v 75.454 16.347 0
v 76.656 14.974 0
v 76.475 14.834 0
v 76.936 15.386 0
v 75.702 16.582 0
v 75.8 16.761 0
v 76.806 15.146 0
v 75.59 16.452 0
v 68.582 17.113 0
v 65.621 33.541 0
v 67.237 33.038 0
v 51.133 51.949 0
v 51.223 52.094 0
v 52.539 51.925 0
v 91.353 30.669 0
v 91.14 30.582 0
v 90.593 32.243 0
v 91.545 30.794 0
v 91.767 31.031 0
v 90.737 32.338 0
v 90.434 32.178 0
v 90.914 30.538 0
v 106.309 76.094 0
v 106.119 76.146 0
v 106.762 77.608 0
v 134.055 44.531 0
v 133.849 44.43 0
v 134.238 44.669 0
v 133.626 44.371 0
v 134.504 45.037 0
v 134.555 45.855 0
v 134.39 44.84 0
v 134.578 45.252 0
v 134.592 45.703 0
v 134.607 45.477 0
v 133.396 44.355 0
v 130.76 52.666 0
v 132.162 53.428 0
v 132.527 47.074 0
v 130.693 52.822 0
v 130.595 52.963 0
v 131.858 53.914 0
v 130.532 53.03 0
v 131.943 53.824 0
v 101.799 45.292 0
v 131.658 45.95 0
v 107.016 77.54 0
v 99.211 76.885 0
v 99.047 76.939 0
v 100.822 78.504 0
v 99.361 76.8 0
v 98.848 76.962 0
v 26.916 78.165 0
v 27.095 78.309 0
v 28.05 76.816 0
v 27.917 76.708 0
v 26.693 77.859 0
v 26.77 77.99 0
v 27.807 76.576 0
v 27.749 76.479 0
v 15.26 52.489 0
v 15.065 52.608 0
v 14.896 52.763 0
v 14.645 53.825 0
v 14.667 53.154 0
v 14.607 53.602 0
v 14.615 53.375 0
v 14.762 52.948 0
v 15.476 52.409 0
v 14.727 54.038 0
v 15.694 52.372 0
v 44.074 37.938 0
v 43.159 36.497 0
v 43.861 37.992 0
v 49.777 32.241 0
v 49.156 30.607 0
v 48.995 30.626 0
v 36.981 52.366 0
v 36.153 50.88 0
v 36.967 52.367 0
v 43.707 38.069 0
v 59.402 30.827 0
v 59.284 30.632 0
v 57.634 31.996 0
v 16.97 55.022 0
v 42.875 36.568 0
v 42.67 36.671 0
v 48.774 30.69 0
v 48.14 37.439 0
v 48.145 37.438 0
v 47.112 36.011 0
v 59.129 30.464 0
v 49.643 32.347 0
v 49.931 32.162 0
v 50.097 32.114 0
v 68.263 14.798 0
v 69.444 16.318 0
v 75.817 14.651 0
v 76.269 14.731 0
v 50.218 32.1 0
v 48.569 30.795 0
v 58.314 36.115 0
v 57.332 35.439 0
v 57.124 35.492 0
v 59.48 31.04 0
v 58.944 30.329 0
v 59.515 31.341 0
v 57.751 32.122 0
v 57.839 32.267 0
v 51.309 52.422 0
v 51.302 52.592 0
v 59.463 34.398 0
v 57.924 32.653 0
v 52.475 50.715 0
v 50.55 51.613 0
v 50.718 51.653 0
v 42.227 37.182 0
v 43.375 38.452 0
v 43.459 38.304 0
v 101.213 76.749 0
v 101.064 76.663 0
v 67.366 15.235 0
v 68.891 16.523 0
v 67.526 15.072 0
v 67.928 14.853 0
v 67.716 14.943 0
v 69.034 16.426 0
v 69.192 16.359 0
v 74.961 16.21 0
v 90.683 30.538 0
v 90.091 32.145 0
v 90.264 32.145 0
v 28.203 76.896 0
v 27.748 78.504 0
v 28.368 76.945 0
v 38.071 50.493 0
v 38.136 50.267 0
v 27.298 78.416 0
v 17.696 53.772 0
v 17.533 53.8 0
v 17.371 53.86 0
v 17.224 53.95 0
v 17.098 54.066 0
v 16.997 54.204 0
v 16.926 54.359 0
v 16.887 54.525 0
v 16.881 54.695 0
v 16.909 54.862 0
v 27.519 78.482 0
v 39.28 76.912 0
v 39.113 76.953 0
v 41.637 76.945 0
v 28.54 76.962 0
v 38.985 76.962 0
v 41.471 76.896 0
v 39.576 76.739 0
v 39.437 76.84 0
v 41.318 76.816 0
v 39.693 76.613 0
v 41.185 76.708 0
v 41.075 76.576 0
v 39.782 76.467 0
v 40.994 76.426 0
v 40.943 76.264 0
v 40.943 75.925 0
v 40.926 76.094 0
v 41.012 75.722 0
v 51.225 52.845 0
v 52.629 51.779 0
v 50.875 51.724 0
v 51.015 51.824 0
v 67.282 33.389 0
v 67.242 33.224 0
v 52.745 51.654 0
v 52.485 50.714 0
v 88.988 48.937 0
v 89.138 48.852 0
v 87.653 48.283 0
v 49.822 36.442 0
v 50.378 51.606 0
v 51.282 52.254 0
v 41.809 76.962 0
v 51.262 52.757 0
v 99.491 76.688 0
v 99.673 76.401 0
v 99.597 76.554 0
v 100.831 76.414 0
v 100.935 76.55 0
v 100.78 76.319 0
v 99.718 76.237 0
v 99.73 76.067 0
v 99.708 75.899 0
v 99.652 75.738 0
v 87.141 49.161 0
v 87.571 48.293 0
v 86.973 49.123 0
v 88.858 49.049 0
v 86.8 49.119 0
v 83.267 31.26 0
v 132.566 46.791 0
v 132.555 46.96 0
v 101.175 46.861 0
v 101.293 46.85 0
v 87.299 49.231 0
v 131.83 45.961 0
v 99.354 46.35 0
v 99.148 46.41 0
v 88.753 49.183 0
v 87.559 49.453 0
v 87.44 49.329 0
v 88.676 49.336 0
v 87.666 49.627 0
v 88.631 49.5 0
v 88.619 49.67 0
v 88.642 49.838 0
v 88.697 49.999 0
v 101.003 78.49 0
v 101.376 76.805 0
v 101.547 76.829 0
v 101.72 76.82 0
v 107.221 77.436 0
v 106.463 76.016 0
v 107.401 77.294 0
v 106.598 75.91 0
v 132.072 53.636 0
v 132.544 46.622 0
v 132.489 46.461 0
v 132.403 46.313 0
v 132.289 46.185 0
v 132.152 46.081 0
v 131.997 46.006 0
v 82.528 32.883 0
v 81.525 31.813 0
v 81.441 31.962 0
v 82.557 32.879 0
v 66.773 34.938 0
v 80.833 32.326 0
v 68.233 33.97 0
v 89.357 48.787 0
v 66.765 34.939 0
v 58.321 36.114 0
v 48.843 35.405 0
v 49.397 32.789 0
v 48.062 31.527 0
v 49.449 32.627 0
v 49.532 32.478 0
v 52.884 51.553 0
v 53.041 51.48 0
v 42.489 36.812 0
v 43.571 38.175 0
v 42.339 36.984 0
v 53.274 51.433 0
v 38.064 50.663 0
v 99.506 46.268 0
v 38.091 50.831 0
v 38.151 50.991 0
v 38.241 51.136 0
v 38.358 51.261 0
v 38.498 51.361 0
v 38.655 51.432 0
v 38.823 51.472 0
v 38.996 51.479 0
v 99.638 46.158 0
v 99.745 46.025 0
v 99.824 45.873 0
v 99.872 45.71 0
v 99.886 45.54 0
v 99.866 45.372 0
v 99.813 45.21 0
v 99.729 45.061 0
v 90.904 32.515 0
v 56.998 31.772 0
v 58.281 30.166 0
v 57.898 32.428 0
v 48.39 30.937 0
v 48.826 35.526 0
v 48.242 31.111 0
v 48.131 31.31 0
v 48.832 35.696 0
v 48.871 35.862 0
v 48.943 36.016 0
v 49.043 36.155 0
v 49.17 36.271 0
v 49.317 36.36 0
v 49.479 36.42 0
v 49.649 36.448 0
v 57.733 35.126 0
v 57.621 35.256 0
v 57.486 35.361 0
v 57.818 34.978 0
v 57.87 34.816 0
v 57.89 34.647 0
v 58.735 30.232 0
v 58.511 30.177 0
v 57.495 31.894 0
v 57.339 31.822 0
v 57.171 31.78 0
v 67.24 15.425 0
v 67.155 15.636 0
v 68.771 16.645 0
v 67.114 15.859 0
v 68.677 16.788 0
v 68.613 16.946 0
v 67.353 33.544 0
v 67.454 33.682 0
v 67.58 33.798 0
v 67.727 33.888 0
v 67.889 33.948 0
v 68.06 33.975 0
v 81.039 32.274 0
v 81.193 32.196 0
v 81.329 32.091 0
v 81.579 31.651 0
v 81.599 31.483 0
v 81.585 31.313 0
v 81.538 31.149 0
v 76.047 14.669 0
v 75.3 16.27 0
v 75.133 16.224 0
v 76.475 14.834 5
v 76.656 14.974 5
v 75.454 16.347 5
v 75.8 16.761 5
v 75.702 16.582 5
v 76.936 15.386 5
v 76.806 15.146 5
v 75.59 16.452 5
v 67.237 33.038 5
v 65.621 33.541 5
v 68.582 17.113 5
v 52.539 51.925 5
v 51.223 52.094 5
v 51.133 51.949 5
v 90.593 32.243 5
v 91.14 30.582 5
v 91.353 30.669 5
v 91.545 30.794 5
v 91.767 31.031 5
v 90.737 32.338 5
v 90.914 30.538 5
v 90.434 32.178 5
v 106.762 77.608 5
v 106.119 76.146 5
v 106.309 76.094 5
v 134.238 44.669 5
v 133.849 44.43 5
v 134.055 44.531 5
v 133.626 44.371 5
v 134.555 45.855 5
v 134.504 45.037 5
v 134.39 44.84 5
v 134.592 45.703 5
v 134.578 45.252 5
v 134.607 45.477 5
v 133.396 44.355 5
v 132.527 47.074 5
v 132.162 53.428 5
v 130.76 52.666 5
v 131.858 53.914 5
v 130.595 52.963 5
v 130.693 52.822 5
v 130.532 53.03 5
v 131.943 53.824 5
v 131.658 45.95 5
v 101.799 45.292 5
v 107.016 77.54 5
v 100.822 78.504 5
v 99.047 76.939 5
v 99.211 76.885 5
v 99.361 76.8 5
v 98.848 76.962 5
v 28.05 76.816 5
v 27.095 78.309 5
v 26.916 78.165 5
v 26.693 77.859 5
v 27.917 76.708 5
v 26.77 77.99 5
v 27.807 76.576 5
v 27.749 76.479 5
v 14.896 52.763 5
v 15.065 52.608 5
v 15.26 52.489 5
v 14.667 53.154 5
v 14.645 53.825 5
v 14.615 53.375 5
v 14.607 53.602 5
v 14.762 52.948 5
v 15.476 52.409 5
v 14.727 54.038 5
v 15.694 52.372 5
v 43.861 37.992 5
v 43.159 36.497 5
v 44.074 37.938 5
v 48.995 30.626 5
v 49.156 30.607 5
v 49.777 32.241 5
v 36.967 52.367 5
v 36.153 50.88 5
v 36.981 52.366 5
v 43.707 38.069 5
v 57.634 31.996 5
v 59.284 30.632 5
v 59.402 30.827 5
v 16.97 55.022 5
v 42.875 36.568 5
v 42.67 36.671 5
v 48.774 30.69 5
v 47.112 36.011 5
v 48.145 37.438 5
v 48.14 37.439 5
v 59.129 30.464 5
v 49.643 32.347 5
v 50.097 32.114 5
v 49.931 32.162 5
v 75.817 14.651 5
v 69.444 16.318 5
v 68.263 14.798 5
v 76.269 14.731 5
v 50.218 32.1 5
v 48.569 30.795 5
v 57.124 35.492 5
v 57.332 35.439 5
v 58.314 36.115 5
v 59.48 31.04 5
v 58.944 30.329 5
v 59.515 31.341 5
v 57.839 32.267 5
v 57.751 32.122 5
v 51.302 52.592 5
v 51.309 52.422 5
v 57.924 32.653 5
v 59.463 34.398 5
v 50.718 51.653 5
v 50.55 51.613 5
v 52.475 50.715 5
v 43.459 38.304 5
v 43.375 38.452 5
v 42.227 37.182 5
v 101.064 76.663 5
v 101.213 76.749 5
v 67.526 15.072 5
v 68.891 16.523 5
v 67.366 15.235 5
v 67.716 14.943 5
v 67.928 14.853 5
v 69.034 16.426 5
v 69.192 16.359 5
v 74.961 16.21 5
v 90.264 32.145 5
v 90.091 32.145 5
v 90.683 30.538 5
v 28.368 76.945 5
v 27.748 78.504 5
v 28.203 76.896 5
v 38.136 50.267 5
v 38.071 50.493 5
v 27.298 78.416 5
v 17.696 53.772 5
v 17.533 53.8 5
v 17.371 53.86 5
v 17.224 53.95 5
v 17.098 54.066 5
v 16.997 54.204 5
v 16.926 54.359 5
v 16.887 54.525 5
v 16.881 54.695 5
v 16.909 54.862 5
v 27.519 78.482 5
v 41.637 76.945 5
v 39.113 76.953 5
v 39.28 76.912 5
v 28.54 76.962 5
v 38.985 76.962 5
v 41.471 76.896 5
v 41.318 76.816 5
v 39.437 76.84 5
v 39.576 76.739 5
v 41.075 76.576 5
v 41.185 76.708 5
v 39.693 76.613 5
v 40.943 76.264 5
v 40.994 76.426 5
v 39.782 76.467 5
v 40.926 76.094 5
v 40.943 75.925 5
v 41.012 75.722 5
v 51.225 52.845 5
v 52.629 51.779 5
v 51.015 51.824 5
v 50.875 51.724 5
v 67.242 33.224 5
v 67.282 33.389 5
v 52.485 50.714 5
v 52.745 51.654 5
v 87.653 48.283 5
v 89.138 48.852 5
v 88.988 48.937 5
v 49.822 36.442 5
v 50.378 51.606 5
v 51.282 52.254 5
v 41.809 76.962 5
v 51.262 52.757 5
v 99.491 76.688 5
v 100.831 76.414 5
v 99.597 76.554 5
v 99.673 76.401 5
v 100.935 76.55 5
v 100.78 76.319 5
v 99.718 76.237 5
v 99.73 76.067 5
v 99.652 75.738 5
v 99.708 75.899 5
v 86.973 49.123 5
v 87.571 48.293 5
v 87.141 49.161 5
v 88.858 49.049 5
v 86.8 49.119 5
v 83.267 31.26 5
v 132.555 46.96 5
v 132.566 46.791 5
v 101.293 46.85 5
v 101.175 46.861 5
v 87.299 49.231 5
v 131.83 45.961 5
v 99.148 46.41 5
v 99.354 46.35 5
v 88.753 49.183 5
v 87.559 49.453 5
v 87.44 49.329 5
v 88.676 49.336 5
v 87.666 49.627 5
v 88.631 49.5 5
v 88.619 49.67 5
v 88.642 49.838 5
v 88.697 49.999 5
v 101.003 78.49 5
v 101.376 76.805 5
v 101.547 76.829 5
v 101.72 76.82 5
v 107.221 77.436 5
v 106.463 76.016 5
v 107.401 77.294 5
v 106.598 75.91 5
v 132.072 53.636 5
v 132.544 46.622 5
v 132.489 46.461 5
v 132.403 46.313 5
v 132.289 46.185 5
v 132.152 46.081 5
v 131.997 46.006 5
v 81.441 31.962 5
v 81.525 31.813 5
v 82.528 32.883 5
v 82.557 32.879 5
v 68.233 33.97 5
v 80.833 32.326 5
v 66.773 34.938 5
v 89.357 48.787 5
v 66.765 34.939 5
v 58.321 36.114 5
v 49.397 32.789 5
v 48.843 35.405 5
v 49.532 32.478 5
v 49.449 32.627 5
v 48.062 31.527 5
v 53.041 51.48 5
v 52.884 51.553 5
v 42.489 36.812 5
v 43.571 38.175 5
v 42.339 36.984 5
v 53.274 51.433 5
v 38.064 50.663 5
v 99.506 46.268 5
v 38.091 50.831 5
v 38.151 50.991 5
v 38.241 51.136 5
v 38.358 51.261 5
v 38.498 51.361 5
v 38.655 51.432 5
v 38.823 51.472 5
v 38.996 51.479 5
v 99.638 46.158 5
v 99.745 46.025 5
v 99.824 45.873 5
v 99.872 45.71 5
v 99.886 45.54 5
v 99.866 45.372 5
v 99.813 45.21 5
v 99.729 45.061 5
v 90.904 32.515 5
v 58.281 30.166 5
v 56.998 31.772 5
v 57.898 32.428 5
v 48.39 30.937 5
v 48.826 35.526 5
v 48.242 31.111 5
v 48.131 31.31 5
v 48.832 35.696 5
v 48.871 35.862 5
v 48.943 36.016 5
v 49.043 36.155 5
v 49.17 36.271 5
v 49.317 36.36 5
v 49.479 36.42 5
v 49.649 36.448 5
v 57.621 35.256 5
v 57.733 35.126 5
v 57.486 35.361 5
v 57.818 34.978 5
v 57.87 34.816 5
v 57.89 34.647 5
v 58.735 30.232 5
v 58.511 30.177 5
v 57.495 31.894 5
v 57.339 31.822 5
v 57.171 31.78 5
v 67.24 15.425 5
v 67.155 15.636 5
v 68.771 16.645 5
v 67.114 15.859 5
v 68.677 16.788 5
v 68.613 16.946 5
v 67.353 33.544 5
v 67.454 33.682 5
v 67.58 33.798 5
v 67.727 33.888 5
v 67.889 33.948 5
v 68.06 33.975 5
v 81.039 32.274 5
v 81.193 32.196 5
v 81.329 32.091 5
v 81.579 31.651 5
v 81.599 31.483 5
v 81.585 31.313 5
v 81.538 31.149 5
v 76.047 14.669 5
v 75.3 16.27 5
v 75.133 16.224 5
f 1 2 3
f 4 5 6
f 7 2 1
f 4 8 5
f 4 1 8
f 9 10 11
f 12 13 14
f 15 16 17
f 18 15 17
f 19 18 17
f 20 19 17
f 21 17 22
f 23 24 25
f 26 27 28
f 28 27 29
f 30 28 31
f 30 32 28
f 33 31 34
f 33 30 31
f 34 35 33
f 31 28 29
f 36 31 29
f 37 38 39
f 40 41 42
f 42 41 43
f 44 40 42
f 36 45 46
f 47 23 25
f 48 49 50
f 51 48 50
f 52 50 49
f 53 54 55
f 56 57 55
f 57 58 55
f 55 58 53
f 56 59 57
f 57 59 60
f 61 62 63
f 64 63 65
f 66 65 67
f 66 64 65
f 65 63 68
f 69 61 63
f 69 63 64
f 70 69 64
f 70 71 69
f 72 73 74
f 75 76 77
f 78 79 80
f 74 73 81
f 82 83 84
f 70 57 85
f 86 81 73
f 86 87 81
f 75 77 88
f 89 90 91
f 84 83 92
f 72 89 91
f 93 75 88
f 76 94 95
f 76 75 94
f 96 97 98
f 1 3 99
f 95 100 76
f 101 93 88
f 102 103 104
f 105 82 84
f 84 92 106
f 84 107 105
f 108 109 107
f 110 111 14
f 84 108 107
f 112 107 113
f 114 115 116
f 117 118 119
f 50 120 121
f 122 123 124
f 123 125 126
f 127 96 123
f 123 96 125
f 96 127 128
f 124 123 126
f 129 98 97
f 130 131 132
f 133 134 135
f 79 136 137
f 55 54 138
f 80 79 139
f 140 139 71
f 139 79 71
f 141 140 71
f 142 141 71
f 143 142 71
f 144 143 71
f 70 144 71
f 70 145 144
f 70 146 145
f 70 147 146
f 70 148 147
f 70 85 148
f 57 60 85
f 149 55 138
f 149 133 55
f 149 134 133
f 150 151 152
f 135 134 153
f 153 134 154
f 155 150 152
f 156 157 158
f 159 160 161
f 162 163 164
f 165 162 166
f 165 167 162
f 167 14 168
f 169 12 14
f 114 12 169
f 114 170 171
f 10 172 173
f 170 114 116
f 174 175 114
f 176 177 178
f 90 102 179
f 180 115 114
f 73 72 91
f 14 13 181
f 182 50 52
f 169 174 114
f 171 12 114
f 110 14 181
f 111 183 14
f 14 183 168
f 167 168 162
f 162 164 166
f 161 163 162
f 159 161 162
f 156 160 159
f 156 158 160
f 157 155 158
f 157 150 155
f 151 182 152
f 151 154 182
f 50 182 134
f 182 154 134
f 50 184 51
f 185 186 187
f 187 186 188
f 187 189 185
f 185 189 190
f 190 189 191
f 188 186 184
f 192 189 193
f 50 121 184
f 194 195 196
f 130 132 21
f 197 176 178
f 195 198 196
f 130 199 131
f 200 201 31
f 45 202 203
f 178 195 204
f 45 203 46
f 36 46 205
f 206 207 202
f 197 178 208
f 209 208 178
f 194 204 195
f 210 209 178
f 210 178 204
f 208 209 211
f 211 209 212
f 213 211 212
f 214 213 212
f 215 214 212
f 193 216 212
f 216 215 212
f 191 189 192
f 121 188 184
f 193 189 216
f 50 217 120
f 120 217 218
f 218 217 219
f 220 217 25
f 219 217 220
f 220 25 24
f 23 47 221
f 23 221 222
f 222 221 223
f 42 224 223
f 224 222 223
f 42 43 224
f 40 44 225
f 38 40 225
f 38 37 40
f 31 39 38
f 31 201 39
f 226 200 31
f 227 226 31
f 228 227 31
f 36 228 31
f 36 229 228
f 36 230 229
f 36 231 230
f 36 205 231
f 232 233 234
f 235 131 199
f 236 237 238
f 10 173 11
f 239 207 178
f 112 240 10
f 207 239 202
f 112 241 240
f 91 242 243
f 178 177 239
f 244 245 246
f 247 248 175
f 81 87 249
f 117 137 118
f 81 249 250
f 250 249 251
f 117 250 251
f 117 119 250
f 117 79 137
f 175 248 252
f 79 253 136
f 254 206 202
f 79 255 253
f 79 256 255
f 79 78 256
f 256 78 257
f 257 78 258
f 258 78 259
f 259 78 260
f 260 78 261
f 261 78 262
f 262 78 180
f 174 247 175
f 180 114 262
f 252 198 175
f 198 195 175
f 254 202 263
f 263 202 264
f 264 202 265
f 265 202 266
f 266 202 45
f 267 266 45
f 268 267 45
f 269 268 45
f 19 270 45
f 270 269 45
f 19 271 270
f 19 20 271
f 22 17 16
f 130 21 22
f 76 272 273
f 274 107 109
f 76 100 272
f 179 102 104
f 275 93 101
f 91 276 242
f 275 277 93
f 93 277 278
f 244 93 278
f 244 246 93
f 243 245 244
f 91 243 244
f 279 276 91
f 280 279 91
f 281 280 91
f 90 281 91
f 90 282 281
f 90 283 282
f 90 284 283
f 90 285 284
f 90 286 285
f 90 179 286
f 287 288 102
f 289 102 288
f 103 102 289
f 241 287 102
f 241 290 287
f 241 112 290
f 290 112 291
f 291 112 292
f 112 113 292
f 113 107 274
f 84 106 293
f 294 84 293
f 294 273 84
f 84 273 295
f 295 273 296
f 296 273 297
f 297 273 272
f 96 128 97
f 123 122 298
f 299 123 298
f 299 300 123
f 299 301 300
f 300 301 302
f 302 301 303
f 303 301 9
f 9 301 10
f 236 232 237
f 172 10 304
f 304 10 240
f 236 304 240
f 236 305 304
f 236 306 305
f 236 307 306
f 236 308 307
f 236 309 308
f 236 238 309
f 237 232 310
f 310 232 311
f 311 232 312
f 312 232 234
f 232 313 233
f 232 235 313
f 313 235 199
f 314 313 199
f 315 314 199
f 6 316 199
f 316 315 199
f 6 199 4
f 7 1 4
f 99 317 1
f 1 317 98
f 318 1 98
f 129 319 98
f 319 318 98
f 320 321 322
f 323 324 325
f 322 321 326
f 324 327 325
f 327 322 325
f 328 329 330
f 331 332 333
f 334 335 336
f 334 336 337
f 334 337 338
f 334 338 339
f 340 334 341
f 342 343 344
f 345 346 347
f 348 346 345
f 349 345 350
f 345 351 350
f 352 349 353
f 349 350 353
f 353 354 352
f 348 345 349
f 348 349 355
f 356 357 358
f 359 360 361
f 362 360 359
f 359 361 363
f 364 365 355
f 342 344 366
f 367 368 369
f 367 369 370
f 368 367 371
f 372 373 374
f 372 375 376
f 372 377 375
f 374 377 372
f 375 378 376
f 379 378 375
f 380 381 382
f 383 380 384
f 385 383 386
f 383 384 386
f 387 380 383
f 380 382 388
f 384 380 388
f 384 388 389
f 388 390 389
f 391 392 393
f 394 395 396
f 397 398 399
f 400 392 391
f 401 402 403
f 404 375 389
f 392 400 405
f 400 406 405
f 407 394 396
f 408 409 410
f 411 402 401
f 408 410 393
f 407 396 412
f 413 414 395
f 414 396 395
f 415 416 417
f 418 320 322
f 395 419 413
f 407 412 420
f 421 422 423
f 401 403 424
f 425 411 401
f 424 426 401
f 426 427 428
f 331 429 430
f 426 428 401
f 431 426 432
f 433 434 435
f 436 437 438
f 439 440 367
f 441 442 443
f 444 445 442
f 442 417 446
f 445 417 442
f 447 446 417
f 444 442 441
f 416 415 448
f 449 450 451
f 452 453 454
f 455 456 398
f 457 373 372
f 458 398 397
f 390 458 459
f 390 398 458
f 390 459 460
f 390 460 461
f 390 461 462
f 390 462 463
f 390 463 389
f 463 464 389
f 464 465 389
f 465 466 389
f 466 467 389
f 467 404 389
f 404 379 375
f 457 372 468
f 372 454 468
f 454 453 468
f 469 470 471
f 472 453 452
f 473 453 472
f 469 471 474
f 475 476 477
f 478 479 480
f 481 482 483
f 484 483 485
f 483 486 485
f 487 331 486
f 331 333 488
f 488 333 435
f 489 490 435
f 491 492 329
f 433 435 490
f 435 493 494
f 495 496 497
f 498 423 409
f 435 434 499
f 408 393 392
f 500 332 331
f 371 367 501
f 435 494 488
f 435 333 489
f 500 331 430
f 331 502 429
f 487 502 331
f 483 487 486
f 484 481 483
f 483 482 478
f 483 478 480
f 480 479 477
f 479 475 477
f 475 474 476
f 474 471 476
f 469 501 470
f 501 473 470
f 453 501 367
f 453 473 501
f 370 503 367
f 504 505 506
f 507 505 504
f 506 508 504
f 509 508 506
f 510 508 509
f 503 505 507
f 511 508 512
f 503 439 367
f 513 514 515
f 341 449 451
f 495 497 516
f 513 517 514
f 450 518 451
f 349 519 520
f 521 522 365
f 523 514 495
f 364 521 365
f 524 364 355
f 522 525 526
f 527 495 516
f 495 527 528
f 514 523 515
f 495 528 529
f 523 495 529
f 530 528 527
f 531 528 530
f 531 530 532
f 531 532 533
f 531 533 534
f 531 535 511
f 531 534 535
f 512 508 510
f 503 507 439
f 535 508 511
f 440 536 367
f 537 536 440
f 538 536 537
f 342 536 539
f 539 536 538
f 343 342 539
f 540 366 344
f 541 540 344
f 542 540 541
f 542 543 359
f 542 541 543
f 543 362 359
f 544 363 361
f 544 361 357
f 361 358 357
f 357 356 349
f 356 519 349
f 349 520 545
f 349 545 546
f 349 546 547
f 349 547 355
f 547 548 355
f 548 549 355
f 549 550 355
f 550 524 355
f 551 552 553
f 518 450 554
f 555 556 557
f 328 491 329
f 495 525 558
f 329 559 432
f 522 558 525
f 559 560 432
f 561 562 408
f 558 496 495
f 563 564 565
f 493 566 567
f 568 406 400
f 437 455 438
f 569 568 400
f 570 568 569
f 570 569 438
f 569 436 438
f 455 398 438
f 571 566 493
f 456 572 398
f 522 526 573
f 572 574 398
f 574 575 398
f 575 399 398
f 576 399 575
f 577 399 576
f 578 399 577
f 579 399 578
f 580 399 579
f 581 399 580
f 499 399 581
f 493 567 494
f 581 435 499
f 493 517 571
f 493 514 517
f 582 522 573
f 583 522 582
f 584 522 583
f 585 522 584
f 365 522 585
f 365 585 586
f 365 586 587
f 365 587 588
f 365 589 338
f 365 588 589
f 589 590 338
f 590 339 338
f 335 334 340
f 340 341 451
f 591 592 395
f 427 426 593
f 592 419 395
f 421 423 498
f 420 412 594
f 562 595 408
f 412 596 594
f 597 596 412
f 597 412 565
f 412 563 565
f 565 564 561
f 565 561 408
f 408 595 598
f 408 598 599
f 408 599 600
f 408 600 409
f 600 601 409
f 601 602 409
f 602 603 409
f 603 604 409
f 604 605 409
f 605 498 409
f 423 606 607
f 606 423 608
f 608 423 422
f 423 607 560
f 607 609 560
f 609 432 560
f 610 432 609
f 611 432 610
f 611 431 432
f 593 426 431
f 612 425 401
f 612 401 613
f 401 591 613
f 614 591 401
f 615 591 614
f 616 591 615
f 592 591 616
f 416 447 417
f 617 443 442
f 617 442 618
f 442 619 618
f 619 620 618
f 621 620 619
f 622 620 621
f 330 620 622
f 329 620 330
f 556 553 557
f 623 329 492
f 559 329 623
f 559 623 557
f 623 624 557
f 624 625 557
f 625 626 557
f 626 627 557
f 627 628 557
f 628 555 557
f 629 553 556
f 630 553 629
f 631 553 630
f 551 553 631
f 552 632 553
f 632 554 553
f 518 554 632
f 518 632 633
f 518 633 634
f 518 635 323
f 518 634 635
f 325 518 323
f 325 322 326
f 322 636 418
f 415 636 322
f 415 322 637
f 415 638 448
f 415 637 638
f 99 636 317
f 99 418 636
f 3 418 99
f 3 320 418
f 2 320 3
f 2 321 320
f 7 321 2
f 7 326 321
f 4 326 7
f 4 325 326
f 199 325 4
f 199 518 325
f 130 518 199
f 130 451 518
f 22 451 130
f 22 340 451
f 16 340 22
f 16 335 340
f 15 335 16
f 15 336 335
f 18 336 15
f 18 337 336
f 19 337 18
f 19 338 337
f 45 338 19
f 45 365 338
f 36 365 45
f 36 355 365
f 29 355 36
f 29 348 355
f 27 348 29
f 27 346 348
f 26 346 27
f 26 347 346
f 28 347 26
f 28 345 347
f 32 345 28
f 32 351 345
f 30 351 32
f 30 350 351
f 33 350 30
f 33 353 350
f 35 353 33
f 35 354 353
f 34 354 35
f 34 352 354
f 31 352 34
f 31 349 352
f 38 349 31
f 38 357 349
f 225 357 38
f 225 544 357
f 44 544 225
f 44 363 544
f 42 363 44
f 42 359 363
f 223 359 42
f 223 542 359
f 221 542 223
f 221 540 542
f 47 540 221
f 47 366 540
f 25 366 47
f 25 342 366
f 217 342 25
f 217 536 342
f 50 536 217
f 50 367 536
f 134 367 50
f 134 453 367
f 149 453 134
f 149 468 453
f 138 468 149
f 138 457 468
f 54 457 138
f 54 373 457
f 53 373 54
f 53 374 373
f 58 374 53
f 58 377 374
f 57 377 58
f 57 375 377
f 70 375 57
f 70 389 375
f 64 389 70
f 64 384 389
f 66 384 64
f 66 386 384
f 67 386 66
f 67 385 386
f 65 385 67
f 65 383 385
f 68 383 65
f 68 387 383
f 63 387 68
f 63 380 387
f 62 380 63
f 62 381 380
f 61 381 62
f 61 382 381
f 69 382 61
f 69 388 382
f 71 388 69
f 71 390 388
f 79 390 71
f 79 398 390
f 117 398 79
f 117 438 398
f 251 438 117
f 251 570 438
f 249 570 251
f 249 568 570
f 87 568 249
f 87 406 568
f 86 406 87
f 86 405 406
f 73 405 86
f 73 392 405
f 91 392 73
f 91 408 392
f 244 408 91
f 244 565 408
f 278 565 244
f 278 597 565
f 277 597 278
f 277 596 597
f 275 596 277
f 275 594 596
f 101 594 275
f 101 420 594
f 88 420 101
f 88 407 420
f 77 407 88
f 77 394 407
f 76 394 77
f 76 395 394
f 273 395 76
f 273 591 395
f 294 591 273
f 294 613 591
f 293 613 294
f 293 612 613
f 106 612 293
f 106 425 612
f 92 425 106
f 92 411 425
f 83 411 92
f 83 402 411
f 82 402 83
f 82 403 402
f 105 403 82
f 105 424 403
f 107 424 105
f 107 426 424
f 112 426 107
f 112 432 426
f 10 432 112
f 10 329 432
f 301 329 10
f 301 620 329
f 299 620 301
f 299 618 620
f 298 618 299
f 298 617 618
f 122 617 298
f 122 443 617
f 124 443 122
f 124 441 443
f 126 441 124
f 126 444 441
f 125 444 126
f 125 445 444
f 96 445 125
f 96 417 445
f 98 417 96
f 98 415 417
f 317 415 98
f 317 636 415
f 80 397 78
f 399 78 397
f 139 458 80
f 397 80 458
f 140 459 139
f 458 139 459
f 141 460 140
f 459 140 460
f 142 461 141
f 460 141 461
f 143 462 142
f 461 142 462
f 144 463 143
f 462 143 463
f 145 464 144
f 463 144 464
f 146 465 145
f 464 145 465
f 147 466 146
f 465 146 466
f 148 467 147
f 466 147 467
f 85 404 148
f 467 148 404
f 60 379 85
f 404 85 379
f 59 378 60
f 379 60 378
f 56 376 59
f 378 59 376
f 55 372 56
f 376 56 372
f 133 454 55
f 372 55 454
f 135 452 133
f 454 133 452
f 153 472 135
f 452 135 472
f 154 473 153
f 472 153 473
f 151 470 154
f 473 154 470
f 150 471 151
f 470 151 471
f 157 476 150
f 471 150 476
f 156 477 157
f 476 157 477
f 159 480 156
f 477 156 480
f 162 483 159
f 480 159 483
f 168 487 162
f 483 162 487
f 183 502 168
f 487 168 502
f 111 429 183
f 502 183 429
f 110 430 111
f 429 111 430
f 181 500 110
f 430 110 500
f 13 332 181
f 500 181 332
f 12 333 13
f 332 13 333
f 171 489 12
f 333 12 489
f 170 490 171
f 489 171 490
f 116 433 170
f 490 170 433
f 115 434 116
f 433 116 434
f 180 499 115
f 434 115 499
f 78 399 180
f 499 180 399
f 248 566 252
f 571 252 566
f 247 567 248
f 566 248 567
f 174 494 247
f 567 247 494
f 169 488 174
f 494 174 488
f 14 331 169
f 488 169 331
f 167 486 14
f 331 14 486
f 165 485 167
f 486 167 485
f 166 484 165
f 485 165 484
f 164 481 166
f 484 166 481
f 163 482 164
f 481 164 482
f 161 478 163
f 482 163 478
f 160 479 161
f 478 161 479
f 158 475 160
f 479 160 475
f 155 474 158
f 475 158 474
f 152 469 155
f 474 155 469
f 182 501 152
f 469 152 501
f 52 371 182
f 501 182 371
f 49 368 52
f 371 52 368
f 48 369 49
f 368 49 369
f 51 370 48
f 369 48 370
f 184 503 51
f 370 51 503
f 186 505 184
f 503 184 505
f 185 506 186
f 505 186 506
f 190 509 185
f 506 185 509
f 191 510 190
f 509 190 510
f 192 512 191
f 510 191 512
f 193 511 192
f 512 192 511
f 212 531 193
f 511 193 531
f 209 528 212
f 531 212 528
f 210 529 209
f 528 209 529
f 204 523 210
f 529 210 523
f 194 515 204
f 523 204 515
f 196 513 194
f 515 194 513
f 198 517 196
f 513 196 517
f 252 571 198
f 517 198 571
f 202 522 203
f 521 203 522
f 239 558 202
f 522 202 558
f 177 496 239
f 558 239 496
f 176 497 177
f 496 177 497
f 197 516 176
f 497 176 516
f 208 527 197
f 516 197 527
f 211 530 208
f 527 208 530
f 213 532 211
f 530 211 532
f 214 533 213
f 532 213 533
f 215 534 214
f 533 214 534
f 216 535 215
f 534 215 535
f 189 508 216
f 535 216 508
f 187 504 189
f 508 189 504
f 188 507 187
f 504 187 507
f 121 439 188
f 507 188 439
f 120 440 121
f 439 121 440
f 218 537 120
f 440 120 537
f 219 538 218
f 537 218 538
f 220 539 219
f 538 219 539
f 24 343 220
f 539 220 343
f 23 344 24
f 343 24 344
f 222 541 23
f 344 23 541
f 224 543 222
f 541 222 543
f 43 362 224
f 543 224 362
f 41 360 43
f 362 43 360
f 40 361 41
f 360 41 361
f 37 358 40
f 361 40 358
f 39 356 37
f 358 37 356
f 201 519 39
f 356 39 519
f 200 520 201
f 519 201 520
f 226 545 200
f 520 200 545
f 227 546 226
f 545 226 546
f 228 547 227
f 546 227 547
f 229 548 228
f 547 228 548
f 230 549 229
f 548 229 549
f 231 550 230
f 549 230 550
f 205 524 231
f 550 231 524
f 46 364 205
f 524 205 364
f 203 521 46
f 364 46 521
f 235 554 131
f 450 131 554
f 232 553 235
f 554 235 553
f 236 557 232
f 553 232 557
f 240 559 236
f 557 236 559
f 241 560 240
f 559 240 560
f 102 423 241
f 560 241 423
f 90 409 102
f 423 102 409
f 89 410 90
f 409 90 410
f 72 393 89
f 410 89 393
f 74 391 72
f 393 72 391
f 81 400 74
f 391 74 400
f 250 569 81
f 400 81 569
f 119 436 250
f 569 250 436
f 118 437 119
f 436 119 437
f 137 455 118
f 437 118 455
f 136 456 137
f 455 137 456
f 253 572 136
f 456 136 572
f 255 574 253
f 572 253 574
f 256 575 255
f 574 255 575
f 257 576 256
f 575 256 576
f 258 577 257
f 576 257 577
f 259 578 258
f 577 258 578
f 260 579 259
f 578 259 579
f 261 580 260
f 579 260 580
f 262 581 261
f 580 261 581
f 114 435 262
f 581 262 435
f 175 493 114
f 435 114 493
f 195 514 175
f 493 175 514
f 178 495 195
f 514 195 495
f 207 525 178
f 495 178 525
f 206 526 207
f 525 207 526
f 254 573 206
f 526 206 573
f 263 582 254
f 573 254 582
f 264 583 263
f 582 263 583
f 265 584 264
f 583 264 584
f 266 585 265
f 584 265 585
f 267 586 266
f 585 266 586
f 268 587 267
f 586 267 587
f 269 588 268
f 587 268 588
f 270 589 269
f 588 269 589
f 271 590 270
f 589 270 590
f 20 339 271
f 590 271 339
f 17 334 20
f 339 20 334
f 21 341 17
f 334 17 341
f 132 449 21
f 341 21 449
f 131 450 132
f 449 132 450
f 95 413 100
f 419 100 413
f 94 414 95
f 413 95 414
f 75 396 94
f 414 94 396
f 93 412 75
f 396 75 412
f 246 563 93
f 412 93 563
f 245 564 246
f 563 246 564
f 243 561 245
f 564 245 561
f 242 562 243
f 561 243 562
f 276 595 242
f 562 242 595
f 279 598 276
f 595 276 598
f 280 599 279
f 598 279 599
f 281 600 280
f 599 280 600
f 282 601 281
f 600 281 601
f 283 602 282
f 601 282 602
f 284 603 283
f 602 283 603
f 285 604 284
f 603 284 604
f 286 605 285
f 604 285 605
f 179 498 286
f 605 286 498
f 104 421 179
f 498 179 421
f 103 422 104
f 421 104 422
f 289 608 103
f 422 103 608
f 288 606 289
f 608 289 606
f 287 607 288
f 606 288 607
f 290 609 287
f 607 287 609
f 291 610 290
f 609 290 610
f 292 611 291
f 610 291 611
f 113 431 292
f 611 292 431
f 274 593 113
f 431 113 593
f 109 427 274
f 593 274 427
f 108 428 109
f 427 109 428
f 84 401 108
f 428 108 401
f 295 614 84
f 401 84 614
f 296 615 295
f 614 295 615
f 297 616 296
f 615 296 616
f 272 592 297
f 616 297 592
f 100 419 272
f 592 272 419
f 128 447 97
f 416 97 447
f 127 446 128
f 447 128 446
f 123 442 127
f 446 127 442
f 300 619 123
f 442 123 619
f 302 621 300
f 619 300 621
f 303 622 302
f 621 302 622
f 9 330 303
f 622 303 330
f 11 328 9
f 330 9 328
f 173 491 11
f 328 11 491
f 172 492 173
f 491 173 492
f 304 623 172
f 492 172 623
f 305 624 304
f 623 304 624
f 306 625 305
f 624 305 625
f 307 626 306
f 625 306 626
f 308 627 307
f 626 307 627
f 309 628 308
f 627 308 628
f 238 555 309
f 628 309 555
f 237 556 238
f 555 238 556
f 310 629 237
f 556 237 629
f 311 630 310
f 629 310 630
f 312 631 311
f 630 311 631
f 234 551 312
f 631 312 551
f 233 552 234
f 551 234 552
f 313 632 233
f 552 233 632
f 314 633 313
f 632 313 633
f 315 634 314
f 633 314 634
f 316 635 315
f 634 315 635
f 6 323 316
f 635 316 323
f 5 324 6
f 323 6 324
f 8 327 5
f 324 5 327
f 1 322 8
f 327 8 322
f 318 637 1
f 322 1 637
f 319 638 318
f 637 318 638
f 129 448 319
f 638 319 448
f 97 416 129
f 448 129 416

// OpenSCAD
/*
 * Customizable Origami - Steamboat - https://www.thingiverse.com/thing:2730388
 * by Dennis Hofmann - https://www.thingiverse.com/mightynozzle/about
 * created 2017-12-25
 * version v1.0
 *
 * Changelog
 * --------------
 * v1.0:
 *      - final design
 * --------------
 * 
 * This work is licensed under the Creative Commons - Attribution - NonCommercial - ShareAlike license.
 * https://creativecommons.org/licenses/by-nc-sa/3.0/
 */


 // Parameter Section //
//-------------------//

// preview[view:north, tilt:top]

// The maximum size of the longest side. The shorter side will be automatically resized in same ratio.
max_size_in_millimeter = 120; //[20:300]

// The height of the model.
model_height_in_millimeter = 5; //[0.2:0.2:100]

// Thickness of the outer outline.
outline_size_in_millimeter = 1.6; //[0.5:0.1:20]

// Thickness of the inner outline.
inline_size_in_millimeter = 0.8; //[0.5:0.1:20]

// Roundiness of the ends of the inner outlines.
inline_edge_radius_in_millimeter = 0.9; //[0.0:0.1:5]

// Flip model
flip_model = "no"; //[yes,no]

/*[hidden]*/
max_size = max_size_in_millimeter;
model_height = model_height_in_millimeter;
$fn=32;

// Outer Points
A1 = [494, 707];
A2 = [579, 512];
A3 = [643, 504];
A4 = [658, 432];
A5 = [780, 426];
A6 = [779, 486];
A7 = [892, 470];
A8 = [913, 217];
A9 = [1014, 215];
A10 = [1103, 442];
A11 = [1214, 431];
A12 = [1353, 632];
A13 = [1784, 619];
A14 = [1752, 722];
A15 = [1425, 1040];
A16 = [1348, 1052];
A17 = [532, 1052];
A18 = [371, 1052];
A19 = [211, 728];

outline = [A1, A2, A3, A4, A5, A6, A7, A8, A9, A10, A11, A12, A13, A14, A15, A16, A17, A18, A19];

// Inner Points
B1 = [702, 695];
B2 = [1172, 662];

// Polygons
C1 = [A8, A9, A10, A7];
C2 = [A4, A5, A6, A3];
C3 = [A2, A3, A6, A7, A10, A11, A12, B2, B1, A1];
C4 = [A19, A18, A17, B1, A1];
C5 = [B1, B2, A16, A17];
C6 = [B2, A12, A13, A14, A15, A16];

cut_polygons = [C1, C2, C3, C4, C5, C6];

min_x = A19[0];
min_y = A9[1];
max_x = A13[0];
max_y = A18[1];

x_size = max_x - min_x;
y_size = max_y - min_y;

x_factor = max_size / x_size;
y_factor = max_size / y_size;

inline_size = x_size > y_size ? inline_size_in_millimeter / x_factor / 2: inline_size_in_millimeter / y_factor / 2;
inline_edge_radius = x_size > y_size ? inline_edge_radius_in_millimeter / x_factor: inline_edge_radius_in_millimeter / y_factor;
outline_size = x_size > y_size ? outline_size_in_millimeter / x_factor - inline_size: outline_size_in_millimeter / y_factor - inline_size;


 // Program Section //
//-----------------//

if(x_size > y_size) {
    resize(newsize=[max_size, x_factor * y_size, model_height]){
        if(flip_model == "yes") {
            mirror([0,1,0]) {
                rotate([180,180,0]) {    
                    create(outline, cut_polygons);
                }
            }
        } else {
            create(outline, cut_polygons);
        }
    }
} else {
    resize(newsize=[y_factor * x_size, max_size, model_height]){
        if(flip_model == "yes") {
            mirror([0,1,0]) {
                rotate([180,180,0]) {    
                    create(outline, cut_polygons);
                }
            }
        } else {
            create(outline, cut_polygons);
        }
    }
}


 // Module Section //
//----------------//

module create() {
    linear_extrude(height=1) {
        difference() {
            offset(r = -0) {
                offset(r = +outline_size) {
                    polygon(points = outline, convexity = 10);
                }
            }
            
            for(cut_polygon = [0:len(cut_polygons)]) {
                offset(r = +inline_edge_radius) {
                    offset(r = -inline_size - inline_edge_radius) {
                        polygon(points = cut_polygons[cut_polygon], convexity = 10);
                    }
                }
            }
        }
    }
}
